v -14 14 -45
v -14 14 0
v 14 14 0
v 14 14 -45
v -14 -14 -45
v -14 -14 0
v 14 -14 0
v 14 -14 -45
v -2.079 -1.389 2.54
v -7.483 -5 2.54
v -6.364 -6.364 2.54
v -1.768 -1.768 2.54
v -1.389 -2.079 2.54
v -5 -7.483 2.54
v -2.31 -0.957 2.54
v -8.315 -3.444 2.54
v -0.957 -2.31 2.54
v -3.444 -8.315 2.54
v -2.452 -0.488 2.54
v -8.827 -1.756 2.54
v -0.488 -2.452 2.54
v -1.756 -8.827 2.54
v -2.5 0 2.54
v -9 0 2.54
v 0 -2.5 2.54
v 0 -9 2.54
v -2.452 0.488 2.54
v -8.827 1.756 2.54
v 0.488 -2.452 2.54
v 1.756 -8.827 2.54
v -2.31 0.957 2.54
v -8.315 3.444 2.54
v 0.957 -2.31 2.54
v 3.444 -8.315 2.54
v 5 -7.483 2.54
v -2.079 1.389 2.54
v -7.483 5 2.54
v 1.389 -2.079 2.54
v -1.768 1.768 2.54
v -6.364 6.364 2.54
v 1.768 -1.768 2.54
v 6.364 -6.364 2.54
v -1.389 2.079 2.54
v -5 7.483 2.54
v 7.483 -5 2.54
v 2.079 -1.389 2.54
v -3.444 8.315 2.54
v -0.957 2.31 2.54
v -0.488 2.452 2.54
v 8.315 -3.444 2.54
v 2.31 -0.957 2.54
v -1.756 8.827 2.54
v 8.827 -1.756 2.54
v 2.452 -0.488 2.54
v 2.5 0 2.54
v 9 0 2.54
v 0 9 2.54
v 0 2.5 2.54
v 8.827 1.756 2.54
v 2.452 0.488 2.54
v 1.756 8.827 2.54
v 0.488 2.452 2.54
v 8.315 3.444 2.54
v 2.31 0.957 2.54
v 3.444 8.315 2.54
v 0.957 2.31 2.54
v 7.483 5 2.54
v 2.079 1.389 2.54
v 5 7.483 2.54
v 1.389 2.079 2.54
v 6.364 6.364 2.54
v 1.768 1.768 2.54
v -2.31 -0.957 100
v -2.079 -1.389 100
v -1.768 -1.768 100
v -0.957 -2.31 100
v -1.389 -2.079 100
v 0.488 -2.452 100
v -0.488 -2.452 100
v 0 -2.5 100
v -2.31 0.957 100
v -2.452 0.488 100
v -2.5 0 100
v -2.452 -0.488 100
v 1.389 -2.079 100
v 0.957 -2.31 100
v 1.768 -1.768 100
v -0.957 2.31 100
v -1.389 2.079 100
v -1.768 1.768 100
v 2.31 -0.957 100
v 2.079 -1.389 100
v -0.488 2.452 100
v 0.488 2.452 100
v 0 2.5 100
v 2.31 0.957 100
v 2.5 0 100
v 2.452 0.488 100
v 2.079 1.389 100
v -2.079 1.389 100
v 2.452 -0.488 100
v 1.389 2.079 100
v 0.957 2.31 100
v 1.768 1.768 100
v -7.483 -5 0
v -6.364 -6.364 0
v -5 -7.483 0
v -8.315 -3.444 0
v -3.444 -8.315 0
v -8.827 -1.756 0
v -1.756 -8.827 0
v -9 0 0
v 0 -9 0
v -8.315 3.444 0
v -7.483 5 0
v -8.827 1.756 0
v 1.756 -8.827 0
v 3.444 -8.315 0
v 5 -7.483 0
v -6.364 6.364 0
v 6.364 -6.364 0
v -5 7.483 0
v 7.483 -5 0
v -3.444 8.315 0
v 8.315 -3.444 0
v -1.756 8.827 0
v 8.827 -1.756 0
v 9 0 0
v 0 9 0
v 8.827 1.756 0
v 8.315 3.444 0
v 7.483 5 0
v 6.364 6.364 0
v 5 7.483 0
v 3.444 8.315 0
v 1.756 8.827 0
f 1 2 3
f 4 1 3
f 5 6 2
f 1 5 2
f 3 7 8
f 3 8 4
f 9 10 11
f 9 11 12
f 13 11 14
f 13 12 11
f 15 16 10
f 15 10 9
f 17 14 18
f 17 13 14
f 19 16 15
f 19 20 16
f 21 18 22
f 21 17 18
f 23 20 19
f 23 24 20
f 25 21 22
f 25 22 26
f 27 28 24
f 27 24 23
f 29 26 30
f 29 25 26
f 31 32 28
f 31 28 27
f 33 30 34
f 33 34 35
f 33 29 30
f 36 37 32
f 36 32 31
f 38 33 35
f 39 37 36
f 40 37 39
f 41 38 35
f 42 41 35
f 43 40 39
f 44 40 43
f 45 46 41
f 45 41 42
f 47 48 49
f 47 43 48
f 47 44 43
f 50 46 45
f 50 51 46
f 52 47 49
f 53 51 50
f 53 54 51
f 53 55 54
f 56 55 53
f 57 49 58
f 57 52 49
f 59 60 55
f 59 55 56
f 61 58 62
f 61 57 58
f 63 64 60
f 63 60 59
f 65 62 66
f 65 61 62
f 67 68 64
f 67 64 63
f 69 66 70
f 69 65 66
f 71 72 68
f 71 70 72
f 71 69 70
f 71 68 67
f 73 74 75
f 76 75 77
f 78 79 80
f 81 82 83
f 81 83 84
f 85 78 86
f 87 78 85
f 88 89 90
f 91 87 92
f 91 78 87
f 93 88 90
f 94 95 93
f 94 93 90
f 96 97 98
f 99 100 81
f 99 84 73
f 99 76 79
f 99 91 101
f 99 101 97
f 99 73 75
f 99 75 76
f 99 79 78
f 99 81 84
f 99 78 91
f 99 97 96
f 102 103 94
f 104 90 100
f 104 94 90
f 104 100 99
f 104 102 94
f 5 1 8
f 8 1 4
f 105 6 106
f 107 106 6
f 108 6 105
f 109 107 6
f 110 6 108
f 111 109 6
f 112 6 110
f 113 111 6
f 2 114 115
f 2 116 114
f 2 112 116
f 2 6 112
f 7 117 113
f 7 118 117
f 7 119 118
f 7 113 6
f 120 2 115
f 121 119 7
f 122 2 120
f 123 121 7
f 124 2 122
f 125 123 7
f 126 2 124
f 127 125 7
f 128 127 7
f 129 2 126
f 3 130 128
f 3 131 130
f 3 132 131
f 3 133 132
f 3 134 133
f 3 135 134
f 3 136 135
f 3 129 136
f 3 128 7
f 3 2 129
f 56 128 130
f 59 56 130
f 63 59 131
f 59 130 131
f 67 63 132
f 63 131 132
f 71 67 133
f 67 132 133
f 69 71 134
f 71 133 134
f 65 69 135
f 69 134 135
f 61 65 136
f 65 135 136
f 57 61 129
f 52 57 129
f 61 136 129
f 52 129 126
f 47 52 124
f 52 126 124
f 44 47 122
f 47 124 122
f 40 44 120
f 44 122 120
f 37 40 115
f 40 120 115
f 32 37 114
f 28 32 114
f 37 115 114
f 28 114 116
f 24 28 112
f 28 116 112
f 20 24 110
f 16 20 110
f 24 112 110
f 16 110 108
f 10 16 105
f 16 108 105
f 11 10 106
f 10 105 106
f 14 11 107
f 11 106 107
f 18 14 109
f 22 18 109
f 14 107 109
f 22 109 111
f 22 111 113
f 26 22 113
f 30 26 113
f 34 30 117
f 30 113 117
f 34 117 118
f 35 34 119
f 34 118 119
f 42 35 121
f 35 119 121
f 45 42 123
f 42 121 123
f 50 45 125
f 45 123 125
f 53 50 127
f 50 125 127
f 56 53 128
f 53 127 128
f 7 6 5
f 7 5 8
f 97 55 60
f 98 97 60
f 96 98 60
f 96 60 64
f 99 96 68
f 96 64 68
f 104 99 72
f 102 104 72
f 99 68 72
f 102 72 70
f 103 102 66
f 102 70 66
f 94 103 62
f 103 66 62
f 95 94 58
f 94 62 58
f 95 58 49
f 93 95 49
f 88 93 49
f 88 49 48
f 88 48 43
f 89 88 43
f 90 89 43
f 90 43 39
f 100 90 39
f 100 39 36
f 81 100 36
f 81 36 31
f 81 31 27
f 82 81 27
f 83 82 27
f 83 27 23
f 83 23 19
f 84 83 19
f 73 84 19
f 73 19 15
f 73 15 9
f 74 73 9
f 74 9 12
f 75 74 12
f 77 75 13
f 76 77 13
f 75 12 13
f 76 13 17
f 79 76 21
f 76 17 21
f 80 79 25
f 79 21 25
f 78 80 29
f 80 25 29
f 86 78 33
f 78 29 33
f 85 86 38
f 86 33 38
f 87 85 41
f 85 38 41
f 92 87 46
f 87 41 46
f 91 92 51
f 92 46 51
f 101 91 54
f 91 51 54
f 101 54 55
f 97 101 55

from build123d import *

# Parameters (mm, degrees)
F0_W     = 28
F0_H     = 28
F0_R     = 9
F0_R_2   = 2.5
F1_DEPTH = 45
F2_DEPTH = 100
F3_DEPTH = 2.54


with BuildPart() as f1:
    # F0 (on Top) → F1 (new body)
    with BuildSketch(Plane.XY):
        Rectangle(F0_W, F0_H)
        Circle(F0_R, mode=Mode.SUBTRACT)
        Circle(F0_R)
        Circle(F0_R_2, mode=Mode.SUBTRACT)
        Circle(F0_R_2)
    extrude(amount=-F1_DEPTH)

    # F0 (on Top) → F2 (join)
    with BuildSketch(Plane.XY):
        Circle(F0_R_2)
    extrude(amount=F2_DEPTH)

    # F0 (on Top) → F3 (join)
    with BuildSketch(Plane.XY):
        Circle(F0_R)
        Circle(F0_R_2, mode=Mode.SUBTRACT)
    extrude(amount=F3_DEPTH)


solid = f1.part
